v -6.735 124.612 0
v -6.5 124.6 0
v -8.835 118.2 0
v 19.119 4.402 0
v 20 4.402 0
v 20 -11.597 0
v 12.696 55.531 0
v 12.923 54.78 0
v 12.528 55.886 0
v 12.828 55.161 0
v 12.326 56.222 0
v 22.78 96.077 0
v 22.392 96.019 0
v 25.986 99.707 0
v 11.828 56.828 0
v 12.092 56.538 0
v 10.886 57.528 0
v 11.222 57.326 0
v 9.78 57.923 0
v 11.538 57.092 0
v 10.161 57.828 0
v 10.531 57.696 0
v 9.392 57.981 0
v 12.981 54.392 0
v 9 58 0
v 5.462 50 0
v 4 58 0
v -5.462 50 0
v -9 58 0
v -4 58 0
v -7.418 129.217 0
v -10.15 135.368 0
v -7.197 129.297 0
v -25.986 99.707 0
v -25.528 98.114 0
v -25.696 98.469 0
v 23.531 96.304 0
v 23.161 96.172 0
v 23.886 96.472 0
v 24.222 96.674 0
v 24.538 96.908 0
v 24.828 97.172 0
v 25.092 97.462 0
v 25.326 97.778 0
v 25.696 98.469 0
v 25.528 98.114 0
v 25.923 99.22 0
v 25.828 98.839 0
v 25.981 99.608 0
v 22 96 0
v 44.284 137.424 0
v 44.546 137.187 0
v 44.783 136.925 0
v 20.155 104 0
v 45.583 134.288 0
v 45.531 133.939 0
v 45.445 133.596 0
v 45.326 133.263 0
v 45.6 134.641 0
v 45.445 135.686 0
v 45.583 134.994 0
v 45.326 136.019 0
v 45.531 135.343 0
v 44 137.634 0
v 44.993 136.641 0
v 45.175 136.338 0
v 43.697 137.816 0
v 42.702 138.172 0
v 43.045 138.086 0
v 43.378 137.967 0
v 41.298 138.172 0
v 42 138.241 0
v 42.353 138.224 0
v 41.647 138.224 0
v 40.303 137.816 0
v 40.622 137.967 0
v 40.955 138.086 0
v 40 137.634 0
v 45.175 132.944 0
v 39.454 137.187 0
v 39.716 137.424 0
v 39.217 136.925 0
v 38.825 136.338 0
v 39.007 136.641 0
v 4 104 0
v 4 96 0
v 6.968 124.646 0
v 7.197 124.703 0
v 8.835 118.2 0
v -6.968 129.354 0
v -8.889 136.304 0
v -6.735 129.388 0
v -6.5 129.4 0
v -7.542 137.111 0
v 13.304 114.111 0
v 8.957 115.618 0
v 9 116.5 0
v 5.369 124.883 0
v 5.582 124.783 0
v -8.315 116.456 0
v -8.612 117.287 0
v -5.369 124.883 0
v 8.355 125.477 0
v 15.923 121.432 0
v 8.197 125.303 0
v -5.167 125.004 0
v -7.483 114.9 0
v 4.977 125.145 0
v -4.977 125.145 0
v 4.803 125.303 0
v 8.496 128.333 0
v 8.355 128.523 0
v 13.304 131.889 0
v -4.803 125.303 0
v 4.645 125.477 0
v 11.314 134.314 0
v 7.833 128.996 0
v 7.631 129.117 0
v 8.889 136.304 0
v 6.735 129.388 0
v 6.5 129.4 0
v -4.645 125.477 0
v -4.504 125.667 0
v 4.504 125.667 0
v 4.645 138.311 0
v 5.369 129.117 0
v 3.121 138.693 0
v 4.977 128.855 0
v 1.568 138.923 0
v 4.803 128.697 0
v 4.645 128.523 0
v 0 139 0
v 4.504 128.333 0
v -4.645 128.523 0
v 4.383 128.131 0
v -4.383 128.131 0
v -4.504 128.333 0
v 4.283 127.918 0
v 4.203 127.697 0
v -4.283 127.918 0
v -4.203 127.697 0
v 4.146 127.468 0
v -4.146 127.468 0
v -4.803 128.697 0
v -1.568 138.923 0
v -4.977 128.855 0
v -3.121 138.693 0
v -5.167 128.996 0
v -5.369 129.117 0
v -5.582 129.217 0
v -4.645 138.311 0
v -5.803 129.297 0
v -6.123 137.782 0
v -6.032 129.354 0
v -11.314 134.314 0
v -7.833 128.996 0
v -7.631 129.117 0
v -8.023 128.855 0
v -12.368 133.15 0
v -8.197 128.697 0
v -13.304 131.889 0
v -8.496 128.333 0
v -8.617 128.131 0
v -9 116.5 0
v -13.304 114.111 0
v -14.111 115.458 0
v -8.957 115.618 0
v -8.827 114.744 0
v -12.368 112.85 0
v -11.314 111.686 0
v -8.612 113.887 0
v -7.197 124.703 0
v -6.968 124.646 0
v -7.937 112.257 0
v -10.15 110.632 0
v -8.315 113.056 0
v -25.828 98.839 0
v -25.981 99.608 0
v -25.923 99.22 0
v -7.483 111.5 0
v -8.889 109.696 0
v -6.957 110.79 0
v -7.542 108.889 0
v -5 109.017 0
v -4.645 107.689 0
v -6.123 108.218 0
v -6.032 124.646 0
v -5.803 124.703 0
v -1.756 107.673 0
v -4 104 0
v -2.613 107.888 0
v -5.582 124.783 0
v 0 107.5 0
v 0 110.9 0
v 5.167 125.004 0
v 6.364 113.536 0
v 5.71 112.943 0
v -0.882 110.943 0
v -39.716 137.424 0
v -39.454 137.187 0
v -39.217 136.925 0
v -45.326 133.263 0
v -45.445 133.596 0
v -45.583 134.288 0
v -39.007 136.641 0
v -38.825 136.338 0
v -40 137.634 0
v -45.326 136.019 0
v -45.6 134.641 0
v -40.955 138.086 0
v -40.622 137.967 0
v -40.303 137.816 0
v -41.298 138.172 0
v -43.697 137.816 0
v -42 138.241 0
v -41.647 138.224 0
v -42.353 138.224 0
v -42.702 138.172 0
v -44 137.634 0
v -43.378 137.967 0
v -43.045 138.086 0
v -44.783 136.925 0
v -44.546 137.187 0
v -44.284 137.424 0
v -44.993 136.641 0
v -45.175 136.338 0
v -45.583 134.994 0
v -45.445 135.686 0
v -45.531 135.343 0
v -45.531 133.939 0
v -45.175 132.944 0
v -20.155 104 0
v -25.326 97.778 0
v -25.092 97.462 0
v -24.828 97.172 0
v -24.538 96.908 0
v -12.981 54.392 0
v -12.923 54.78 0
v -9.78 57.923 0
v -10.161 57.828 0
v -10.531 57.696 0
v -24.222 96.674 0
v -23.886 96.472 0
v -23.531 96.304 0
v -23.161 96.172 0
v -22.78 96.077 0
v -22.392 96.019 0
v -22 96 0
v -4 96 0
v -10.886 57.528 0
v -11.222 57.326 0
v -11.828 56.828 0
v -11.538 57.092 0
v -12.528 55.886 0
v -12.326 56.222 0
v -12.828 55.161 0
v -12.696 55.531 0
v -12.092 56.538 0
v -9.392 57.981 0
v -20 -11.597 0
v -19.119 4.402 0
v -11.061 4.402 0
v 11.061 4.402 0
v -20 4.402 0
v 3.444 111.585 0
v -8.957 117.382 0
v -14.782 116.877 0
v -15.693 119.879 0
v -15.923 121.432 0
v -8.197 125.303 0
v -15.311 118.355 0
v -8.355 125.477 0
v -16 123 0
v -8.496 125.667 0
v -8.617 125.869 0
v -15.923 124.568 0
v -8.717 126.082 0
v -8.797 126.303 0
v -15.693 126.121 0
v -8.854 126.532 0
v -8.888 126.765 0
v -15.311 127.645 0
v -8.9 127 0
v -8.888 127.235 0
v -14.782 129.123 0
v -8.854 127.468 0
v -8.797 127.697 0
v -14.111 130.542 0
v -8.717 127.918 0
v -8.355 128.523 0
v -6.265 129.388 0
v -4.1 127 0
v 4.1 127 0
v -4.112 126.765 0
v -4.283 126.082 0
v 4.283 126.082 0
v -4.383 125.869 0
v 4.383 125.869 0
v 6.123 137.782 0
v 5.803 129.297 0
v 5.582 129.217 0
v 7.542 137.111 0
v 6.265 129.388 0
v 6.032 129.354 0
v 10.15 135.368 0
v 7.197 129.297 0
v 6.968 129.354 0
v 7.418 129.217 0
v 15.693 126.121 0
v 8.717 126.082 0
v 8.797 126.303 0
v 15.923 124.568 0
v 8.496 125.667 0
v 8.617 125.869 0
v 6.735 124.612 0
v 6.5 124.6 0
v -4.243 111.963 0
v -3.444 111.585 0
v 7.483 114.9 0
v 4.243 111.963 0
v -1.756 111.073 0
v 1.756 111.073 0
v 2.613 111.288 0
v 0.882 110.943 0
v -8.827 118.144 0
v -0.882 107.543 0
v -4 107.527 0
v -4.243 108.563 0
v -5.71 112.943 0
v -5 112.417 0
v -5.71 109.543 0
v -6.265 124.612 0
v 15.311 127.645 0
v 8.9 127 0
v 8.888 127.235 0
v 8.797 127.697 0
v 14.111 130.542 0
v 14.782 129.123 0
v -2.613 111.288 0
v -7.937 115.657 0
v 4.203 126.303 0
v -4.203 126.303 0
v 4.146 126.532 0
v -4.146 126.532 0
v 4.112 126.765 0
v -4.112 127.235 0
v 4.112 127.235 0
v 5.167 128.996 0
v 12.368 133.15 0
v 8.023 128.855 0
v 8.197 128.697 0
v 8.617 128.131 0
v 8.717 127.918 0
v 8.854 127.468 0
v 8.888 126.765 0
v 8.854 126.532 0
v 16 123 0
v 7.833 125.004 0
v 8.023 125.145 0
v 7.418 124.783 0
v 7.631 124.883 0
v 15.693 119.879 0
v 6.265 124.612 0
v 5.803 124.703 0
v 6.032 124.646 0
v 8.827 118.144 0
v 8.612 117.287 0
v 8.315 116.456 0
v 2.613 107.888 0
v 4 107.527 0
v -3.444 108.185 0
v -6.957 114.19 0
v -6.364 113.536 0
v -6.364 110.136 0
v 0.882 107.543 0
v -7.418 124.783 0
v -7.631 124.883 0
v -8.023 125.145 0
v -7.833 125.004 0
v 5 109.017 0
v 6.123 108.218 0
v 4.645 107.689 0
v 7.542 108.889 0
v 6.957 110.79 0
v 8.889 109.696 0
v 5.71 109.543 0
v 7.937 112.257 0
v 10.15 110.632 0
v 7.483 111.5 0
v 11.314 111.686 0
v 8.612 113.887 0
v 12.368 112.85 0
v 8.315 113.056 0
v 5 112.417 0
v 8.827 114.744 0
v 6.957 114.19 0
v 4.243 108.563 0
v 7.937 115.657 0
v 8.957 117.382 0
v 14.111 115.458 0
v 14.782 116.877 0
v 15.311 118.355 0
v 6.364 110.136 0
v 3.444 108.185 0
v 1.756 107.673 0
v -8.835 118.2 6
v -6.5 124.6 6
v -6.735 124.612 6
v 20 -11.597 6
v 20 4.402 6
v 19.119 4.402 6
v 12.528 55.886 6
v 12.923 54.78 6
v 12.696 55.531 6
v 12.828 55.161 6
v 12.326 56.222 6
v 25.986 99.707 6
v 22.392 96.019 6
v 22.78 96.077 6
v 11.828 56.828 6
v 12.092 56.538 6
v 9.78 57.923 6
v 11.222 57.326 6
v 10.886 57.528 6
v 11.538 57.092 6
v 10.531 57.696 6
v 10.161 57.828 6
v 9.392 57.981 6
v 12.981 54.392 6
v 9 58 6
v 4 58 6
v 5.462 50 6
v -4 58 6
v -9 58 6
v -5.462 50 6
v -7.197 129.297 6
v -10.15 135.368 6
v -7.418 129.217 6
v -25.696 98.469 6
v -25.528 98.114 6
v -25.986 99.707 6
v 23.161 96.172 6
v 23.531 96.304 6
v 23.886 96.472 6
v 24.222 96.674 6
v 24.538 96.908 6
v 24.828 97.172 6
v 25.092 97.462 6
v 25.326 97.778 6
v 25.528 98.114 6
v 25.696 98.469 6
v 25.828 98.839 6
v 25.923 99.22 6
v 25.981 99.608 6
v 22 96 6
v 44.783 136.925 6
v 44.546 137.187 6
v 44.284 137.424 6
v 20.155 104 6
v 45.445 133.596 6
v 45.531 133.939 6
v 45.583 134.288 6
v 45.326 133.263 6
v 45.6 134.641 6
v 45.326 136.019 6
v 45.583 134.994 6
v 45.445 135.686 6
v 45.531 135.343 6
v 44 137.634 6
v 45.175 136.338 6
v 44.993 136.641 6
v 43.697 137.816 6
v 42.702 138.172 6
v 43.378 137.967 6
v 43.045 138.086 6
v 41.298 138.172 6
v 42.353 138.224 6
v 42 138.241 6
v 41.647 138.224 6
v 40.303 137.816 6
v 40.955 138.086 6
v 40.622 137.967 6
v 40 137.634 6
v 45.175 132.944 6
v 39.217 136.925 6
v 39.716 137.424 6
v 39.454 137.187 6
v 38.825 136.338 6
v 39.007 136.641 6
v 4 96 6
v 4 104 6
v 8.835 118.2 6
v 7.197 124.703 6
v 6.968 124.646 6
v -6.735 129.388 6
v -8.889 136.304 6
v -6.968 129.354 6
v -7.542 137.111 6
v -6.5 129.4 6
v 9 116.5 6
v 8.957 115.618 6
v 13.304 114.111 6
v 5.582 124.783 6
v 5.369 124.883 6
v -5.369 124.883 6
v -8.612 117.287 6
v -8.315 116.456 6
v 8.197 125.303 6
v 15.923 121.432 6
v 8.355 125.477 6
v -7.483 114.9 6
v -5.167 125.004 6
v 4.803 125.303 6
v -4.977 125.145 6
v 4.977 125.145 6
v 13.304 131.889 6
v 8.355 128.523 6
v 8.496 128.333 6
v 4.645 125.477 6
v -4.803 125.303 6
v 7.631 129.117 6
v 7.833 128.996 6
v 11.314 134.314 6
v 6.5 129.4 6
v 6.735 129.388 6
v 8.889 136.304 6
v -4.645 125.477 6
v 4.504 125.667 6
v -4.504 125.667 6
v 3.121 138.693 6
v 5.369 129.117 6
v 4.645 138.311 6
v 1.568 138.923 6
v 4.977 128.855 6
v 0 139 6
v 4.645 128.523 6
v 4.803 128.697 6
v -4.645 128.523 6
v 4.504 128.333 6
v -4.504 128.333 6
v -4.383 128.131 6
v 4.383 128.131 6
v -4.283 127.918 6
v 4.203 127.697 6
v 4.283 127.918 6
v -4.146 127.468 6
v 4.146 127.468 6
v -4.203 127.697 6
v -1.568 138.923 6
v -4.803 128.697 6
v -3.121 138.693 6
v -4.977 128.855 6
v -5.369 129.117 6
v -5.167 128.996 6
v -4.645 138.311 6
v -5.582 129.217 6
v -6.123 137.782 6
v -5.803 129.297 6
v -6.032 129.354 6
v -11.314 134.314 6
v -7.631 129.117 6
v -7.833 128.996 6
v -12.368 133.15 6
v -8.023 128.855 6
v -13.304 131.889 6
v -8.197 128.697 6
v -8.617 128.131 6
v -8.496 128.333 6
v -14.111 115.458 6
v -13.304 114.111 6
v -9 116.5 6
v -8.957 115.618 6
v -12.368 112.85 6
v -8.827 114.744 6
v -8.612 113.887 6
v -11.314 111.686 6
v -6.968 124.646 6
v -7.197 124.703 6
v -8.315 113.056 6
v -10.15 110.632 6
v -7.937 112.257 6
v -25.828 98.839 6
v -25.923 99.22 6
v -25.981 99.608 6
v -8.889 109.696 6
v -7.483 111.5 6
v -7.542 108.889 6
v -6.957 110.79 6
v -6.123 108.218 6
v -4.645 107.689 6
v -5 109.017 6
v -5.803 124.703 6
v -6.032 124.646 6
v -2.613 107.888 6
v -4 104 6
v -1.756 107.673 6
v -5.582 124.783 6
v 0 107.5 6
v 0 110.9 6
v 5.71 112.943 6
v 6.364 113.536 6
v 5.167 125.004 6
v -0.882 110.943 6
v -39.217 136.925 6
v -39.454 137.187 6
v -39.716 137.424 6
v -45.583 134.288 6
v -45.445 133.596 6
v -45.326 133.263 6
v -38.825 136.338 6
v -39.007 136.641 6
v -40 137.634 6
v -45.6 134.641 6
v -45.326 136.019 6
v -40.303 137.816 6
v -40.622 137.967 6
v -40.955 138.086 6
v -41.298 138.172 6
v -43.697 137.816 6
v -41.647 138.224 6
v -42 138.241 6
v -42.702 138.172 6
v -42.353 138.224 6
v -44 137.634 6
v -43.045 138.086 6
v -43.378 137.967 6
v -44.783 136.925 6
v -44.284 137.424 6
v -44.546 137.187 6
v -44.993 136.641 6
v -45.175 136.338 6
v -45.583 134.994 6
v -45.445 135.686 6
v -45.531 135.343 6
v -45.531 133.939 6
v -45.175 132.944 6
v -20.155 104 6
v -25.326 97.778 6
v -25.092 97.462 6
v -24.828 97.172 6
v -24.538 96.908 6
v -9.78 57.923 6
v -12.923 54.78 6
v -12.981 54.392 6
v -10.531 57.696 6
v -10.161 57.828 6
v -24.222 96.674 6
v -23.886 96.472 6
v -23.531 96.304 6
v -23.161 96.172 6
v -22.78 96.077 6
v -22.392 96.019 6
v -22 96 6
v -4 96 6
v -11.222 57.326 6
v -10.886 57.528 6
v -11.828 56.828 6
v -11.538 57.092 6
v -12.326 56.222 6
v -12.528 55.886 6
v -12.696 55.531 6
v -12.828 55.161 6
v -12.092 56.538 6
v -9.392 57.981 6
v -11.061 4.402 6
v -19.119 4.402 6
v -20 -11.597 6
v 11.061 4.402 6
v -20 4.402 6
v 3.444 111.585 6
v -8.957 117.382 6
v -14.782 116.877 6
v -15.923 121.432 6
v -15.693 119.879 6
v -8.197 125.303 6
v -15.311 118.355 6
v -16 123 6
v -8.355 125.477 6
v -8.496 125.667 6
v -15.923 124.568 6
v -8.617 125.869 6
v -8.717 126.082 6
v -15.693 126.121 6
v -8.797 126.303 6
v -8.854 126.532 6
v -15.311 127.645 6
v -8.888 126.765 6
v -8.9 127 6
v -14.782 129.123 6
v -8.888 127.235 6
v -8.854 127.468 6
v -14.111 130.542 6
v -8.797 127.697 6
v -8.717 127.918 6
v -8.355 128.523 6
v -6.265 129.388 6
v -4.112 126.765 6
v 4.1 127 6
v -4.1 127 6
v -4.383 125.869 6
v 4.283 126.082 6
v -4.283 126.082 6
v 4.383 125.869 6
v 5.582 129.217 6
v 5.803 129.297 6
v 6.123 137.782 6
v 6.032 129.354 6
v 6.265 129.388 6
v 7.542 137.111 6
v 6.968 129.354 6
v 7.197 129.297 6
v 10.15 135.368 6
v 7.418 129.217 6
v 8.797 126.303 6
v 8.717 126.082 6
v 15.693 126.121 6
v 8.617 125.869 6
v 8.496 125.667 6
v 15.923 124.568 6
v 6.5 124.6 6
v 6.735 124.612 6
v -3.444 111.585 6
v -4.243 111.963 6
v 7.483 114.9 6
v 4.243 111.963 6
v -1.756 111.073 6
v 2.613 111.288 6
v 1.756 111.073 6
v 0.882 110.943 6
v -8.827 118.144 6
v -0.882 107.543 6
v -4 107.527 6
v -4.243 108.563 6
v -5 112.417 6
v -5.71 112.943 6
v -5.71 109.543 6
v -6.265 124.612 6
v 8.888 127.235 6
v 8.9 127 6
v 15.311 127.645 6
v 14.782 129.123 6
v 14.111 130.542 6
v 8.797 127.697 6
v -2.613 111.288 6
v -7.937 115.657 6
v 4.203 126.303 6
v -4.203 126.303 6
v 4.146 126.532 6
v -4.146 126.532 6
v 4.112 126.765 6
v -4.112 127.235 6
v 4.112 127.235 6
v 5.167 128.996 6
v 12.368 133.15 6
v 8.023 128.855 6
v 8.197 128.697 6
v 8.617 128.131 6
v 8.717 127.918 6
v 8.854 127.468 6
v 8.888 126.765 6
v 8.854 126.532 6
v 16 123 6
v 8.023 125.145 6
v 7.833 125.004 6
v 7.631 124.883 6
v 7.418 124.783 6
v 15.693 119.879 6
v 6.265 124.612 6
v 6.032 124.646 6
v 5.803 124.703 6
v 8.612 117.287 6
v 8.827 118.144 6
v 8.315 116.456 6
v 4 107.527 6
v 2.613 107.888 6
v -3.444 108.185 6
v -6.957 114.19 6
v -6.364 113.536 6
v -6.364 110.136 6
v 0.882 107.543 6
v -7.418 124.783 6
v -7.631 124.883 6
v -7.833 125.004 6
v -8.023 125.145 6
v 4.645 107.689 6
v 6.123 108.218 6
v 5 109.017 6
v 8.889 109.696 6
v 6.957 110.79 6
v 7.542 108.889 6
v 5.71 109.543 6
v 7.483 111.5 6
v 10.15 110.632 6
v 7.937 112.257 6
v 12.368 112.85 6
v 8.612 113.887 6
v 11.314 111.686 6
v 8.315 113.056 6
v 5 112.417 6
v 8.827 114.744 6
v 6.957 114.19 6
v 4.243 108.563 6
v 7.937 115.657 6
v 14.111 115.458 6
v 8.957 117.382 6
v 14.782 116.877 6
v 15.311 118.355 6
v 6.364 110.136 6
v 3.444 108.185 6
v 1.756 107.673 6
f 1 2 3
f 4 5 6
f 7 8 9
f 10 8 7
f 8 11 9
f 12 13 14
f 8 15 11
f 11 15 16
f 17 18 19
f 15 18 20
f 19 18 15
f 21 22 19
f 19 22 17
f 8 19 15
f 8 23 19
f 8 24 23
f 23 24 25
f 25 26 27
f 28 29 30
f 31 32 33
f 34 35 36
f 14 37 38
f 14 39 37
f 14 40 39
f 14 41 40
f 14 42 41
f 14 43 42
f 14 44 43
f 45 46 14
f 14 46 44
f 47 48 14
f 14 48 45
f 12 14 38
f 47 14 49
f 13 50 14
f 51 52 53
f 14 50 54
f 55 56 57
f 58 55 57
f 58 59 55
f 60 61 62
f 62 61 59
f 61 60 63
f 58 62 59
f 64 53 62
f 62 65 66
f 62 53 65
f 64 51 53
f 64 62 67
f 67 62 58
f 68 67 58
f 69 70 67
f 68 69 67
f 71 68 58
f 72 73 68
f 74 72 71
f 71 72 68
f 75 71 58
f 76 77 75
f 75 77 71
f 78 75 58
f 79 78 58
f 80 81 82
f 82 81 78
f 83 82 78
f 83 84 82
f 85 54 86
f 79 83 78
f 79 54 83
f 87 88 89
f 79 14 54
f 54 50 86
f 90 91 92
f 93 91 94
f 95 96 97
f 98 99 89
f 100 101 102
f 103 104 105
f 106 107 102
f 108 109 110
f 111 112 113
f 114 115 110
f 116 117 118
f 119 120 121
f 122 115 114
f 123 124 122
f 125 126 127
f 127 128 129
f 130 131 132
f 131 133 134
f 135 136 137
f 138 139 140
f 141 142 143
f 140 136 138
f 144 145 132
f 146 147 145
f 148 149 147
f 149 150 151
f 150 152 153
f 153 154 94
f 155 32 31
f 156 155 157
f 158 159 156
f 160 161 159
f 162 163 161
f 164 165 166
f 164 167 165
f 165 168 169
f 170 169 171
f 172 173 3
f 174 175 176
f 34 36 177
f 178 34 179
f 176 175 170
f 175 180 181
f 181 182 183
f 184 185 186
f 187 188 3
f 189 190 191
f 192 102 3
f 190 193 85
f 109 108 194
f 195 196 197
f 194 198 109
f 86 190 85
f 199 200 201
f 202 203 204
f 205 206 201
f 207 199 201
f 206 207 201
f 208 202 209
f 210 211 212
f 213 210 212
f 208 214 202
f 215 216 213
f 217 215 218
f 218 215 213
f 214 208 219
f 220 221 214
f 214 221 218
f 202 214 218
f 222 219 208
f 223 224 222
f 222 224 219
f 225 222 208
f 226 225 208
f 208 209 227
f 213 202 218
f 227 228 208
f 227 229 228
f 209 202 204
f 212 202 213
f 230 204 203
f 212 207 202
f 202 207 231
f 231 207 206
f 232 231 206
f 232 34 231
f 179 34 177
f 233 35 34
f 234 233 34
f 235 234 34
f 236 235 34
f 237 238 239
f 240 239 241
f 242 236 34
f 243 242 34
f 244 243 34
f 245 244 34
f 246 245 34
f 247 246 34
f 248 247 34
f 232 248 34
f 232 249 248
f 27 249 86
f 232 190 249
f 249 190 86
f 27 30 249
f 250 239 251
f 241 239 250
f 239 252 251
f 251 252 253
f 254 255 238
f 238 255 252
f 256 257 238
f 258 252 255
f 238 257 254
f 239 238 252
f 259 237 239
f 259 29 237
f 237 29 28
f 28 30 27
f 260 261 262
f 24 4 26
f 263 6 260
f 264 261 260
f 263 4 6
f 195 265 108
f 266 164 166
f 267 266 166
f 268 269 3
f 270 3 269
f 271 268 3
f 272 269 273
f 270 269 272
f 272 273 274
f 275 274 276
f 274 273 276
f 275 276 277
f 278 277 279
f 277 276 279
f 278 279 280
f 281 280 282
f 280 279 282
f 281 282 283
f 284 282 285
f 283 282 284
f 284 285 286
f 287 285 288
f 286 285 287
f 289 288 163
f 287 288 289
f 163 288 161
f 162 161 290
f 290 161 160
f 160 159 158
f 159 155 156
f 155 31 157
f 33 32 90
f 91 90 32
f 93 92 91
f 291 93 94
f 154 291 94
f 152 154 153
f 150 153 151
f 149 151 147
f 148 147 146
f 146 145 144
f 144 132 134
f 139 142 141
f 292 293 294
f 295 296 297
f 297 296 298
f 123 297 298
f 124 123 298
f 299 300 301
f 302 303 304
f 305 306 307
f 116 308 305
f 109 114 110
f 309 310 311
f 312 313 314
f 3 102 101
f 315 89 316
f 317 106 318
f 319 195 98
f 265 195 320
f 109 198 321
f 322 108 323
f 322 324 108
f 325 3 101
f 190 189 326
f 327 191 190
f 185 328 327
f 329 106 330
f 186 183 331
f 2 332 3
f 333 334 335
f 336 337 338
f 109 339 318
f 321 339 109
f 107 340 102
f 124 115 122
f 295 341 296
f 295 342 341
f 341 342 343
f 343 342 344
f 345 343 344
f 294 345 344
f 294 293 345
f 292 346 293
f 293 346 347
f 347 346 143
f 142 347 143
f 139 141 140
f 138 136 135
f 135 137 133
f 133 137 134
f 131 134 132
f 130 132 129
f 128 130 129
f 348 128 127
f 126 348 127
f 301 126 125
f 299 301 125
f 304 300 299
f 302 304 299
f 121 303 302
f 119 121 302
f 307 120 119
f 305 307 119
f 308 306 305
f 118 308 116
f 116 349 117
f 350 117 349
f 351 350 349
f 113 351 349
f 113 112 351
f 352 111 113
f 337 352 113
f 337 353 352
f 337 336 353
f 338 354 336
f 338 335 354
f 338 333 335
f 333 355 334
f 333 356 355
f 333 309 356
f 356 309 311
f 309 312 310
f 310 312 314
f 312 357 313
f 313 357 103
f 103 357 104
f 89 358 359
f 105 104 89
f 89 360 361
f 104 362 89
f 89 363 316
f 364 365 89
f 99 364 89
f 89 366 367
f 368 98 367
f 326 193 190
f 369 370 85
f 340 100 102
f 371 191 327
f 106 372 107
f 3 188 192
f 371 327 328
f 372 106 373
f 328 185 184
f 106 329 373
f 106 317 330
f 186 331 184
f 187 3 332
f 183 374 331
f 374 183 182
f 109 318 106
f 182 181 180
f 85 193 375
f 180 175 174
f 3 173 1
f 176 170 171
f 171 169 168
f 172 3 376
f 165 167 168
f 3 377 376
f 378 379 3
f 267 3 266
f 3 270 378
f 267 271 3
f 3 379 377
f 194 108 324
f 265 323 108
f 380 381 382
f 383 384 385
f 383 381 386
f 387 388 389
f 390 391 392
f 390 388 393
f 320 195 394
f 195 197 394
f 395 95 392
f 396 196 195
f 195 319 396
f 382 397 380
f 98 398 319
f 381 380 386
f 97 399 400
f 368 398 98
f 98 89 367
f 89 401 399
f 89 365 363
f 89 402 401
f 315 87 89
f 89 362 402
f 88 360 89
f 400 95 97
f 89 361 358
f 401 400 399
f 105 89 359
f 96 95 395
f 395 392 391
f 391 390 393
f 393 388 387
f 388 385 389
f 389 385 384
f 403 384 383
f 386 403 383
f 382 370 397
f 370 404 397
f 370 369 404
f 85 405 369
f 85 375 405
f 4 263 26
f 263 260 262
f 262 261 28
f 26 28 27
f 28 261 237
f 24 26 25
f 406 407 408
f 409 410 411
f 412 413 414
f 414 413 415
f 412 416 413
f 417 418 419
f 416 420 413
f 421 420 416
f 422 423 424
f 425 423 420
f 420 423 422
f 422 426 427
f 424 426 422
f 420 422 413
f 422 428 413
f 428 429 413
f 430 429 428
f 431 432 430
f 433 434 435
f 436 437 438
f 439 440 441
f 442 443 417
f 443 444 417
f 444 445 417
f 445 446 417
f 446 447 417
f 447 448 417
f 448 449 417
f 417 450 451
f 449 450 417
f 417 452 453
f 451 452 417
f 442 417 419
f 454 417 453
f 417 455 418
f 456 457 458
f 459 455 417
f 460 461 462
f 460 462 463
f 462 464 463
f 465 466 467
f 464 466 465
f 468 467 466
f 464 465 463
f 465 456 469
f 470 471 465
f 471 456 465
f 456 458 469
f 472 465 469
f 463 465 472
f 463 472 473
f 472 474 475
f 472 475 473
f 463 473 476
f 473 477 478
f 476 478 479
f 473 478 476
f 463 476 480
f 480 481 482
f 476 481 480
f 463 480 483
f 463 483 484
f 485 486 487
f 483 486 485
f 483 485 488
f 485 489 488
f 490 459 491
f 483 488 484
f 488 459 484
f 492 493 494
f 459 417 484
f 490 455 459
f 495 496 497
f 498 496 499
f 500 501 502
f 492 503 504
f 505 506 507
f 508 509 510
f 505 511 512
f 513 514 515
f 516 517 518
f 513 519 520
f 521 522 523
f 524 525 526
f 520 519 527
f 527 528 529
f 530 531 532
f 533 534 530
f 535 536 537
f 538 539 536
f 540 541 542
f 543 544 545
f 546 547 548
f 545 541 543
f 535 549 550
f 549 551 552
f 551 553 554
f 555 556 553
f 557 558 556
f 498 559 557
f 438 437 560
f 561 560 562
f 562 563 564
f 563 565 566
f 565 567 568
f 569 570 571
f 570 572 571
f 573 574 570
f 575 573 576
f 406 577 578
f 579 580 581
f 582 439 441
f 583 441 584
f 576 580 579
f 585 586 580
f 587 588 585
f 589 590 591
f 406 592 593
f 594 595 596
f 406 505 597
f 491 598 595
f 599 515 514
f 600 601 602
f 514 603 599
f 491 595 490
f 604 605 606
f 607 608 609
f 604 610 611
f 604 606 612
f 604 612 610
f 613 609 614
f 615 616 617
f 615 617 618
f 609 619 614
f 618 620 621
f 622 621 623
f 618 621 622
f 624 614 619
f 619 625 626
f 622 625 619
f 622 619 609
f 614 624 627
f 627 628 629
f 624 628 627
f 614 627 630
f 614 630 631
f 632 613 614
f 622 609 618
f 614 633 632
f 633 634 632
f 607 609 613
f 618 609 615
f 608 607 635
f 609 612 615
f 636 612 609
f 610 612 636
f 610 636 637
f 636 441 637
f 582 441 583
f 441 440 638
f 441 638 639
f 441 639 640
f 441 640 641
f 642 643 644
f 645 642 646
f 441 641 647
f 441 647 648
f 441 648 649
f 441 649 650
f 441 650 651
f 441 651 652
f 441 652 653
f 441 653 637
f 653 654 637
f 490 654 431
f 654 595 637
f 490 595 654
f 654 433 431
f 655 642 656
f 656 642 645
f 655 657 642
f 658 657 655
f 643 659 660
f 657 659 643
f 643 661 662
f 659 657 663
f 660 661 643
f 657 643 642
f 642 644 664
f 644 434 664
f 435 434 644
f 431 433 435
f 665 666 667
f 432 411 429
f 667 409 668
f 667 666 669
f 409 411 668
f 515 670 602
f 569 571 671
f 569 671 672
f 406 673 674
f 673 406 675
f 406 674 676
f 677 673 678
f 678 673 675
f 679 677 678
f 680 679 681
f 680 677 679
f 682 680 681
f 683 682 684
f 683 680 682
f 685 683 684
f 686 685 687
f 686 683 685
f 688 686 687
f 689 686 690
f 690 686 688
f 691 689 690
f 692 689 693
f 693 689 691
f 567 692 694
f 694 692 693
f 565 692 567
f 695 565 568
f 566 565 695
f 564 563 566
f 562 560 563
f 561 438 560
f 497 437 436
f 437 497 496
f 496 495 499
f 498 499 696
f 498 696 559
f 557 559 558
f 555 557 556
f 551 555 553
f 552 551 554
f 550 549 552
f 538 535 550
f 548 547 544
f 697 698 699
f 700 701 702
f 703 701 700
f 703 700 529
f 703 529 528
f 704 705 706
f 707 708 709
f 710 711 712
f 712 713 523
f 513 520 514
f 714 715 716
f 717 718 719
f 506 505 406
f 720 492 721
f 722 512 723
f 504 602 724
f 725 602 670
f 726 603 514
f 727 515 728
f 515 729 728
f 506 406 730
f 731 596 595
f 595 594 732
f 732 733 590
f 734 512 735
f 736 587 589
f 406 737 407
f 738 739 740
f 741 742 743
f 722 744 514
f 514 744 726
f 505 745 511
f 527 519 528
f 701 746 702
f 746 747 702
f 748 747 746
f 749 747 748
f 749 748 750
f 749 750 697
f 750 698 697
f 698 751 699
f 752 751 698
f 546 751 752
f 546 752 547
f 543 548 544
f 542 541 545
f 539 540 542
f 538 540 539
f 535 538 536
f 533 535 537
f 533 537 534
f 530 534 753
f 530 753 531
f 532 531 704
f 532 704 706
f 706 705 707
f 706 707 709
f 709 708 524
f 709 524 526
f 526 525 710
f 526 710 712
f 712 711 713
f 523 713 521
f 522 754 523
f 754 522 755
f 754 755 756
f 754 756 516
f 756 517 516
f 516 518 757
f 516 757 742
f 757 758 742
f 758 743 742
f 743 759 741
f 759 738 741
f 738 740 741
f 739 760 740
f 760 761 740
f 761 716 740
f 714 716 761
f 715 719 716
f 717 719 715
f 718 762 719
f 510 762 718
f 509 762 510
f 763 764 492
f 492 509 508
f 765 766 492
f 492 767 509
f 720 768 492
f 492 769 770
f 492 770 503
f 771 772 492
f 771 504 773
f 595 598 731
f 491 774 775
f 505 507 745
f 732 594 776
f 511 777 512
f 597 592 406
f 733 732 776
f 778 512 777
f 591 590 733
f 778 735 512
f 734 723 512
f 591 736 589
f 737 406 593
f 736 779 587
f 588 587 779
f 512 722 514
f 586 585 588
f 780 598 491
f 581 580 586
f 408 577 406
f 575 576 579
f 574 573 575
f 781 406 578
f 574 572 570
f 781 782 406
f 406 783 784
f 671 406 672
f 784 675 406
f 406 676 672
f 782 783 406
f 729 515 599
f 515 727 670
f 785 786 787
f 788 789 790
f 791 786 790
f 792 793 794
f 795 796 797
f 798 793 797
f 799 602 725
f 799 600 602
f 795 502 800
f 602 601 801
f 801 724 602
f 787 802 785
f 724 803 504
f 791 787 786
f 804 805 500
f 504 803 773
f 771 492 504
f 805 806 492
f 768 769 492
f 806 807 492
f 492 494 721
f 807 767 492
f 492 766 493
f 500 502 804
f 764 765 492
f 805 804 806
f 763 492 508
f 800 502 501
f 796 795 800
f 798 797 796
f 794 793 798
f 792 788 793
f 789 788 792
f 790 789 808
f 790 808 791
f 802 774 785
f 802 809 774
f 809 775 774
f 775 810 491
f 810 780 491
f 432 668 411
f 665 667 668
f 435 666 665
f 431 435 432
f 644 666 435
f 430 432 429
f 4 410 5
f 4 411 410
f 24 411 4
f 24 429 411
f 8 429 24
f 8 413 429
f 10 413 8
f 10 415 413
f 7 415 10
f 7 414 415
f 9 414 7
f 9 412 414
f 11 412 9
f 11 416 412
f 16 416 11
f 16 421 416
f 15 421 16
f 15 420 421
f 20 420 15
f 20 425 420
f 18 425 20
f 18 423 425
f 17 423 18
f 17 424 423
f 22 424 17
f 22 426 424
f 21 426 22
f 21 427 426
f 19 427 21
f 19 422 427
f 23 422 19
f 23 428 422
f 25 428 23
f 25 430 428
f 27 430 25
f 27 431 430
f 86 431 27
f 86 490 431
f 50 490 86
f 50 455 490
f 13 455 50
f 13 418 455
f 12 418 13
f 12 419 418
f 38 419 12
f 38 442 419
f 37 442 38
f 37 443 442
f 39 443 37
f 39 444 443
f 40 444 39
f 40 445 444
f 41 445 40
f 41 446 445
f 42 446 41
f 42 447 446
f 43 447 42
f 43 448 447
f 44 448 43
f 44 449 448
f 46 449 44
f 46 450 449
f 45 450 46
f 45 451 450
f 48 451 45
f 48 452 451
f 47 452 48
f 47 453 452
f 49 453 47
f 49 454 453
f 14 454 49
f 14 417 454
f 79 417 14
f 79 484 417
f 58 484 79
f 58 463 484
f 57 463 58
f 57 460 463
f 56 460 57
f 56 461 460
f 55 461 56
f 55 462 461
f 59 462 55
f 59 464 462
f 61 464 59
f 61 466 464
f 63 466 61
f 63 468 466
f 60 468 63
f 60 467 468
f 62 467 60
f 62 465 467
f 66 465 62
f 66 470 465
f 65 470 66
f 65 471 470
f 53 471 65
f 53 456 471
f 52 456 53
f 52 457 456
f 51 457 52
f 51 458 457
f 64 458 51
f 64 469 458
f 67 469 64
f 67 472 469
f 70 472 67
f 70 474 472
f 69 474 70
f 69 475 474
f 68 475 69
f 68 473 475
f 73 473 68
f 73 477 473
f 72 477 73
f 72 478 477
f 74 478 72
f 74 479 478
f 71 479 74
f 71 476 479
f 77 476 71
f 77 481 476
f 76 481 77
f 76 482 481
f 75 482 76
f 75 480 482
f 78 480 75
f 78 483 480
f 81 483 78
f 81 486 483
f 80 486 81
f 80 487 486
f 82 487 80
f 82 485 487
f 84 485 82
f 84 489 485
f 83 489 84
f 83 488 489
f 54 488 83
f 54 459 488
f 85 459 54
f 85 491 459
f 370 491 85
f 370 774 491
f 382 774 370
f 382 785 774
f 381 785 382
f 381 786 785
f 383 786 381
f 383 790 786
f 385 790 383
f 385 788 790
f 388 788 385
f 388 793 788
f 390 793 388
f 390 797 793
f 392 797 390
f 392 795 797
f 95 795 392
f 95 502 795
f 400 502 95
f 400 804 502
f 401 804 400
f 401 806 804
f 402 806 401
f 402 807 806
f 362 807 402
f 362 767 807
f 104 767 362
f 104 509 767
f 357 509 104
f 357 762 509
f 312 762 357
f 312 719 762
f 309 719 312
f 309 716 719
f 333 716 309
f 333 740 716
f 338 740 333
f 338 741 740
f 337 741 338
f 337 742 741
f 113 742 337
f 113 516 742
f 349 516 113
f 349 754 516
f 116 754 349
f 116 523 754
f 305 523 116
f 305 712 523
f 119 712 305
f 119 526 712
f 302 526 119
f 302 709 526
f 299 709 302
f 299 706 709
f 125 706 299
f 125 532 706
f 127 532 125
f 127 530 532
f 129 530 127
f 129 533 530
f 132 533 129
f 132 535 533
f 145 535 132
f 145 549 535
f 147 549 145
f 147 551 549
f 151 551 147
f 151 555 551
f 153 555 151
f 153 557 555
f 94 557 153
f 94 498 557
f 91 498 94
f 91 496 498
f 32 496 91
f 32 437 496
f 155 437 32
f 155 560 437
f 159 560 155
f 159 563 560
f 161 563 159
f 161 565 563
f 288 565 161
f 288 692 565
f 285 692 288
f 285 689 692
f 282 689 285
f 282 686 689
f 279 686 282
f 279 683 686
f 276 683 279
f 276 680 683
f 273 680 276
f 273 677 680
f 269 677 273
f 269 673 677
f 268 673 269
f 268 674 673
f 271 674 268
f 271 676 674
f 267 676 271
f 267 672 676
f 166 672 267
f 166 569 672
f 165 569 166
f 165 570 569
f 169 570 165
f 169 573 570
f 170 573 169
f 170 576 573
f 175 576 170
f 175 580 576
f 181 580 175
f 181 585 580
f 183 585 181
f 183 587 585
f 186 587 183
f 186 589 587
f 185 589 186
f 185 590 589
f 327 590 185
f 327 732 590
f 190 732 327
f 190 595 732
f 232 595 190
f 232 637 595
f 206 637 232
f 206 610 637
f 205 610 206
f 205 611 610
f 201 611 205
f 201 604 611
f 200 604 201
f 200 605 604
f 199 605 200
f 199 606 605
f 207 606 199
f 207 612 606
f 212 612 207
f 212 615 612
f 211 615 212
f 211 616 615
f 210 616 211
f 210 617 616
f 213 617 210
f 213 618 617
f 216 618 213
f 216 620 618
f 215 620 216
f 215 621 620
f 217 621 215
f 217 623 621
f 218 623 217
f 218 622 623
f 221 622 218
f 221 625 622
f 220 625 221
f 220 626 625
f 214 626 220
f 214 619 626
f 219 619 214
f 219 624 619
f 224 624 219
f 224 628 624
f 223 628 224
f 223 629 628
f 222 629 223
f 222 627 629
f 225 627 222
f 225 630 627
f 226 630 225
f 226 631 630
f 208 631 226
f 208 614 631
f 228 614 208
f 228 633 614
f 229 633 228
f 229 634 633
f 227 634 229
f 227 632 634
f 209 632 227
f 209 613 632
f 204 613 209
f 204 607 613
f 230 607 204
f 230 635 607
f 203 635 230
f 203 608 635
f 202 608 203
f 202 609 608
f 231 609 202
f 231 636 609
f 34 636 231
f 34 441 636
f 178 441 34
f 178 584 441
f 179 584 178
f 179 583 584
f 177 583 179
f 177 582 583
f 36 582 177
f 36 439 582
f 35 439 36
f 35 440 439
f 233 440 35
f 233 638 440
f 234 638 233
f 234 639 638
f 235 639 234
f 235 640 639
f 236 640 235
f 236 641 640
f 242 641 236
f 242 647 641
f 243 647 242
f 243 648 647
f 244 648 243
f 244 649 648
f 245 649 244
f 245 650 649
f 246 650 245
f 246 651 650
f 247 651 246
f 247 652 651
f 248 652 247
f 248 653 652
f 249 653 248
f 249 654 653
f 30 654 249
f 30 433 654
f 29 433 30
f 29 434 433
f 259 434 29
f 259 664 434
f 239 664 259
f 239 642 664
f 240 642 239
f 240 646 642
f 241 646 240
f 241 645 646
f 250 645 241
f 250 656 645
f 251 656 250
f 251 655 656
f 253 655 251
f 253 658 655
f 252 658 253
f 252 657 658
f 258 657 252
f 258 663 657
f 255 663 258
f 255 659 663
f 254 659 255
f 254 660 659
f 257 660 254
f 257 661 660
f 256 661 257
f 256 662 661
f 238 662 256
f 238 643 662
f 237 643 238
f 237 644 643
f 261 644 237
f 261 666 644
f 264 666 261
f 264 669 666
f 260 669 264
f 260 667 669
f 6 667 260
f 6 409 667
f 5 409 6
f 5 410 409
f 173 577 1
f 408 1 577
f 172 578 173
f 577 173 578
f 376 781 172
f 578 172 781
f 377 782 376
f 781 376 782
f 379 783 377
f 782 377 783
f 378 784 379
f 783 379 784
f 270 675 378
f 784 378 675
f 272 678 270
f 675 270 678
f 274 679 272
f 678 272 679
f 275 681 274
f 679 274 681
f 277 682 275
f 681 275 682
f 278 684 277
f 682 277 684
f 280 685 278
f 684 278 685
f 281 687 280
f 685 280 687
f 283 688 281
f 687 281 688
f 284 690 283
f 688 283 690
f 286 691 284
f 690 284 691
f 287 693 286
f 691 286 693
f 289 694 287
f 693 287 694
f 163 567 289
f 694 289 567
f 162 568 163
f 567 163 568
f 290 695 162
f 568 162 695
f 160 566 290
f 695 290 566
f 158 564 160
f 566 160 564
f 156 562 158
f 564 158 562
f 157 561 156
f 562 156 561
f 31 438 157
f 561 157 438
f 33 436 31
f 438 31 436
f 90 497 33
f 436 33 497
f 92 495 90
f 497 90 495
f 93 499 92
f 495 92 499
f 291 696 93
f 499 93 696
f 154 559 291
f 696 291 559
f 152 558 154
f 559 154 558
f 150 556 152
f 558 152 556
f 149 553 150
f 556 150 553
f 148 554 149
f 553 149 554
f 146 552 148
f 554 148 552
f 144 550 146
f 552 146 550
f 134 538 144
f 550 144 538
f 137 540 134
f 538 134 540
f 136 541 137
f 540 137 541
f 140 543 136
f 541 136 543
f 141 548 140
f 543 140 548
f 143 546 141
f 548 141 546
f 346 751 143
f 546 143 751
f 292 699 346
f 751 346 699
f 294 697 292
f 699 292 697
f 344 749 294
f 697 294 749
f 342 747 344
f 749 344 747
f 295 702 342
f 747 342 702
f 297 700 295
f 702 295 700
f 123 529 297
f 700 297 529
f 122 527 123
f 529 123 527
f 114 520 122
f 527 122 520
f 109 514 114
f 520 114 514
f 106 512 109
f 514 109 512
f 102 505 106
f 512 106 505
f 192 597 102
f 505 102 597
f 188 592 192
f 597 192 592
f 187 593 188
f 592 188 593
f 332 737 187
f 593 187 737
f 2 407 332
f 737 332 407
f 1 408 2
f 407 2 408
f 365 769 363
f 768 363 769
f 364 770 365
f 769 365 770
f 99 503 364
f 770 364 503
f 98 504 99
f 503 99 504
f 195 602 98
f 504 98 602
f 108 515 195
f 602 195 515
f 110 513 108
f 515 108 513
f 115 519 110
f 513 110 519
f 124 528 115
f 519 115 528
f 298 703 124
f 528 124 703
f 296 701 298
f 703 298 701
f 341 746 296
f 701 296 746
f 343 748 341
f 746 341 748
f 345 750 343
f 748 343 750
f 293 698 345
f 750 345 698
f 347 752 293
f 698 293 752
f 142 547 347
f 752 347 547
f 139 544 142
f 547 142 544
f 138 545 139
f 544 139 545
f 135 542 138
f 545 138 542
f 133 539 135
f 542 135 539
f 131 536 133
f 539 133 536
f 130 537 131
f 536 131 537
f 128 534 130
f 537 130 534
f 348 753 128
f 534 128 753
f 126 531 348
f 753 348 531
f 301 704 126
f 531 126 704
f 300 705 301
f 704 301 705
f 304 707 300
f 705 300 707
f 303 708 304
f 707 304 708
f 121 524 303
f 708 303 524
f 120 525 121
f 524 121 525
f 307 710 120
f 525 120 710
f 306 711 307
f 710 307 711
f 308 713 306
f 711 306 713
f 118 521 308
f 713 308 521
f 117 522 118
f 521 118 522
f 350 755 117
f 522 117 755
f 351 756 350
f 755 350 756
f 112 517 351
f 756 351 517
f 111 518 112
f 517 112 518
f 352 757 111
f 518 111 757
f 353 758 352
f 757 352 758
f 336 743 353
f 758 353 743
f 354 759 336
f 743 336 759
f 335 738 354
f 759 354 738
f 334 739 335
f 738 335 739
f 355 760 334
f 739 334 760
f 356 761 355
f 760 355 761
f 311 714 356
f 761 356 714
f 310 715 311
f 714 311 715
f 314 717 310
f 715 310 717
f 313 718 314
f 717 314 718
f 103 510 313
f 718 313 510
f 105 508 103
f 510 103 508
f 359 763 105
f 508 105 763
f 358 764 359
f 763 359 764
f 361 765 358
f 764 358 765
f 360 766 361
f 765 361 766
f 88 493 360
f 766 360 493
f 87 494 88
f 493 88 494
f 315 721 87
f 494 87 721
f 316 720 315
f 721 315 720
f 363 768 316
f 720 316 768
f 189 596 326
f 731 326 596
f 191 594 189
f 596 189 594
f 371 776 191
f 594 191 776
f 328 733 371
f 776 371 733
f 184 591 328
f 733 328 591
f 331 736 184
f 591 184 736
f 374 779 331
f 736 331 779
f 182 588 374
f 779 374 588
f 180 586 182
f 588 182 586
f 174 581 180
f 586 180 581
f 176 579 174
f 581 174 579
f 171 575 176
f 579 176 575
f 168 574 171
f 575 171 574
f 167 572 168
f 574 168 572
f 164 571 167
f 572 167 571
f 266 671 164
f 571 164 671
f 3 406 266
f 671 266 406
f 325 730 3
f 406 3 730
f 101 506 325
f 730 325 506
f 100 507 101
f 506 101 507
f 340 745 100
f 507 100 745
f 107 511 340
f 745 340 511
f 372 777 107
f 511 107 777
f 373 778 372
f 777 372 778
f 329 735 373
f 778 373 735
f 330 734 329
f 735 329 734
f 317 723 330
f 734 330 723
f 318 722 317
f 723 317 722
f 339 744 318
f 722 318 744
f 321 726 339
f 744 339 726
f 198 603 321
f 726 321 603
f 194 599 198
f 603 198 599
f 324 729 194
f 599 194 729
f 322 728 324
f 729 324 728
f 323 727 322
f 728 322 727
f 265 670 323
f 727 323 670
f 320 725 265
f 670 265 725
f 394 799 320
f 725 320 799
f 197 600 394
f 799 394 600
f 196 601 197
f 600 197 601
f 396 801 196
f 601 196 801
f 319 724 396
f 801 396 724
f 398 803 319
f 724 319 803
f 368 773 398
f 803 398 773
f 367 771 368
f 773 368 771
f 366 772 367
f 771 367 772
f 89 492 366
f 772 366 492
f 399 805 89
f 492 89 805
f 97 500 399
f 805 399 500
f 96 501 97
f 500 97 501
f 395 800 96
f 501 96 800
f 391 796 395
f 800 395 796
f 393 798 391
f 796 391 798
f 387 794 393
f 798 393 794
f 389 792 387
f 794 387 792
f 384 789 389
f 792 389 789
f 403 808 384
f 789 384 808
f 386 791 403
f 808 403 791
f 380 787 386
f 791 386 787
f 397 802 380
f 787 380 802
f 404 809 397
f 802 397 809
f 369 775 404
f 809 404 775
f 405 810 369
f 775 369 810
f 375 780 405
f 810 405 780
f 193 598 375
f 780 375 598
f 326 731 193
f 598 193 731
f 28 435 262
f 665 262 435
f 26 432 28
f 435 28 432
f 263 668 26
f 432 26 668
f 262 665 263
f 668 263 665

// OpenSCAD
// Stick figure photography props - happy, sad, shocked, scared, stoic,
// half, and poe (Edgar Allan Poe)
// Flat cutouts, printed lying flat. No supports.
//   figure: openscad -D 'mood="sad"'   -o stick_sad.stl   stick_figures.scad
//   stand:  openscad -D 'part="stand"' -o stick_stand.stl stick_figures.scad

part       = "figure"; // "figure" | "stand" | "raven"
base       = "tang";   // "tang" = plugs into the separate stand
                       // "block" = cast into a solid plinth, prints standalone
mood       = "happy";  // happy | sad | shocked | scared | stoic | half | poe
render_all = false;    // true = lay out all seven moods side by side (preview only)
                       // (poe's hair, collar and longer neck follow `mood`, so
                       // they only appear when mood = "poe")

$fn = 64;

thickness = 6;   // extrusion depth; also the stand slot thickness
limb_w    = 8;
head_r    = 16;

hip_y      = 54;  // height of the pelvis above the feet
torso_len  = 46;  // pelvis -> shoulder line
shoulder_w = 44;  // full width of the shoulder bar (this is what was missing)
hip_w      = 18;  // full width of the pelvis bar
arm_len    = 40;
leg_len    = 54;
// poe needs a longer neck than the rest of the family: a wing collar has to be
// visible BETWEEN the chin and the shoulder bar, and 7mm of neck leaves it
// looking like a slightly fat neck instead of a collar.
neck_len   = (mood == "poe") ? 14 : 7;

tang_w = 40;  // plug under the feet that drops into the stand
tang_h = 12;

// For OTHER files that plug into this stand: `use` this file and call
// tang_dims() for [width, height, thickness] rather than retyping them.
function tang_dims() = [tang_w, tang_h, thickness];

// base = "block": cast the legs into a solid plinth instead. Prints as one
// piece, stands unaided, no separate stand needed.
block_w = 58;
block_h = 28;
block_d = 22;  // front-to-back depth; this is what keeps it upright
block_over = 1;  // how far the plinth rises past the tang - see figure()

fit_clearance = 0.5;  // slot is this much wider than `thickness`
                      // verified on the P1S in PLA: snug, correct fit
stand_l = 76;
stand_w = 34;
stand_h = 16;
slot_d  = 13;

spacing = 130;  // preview layout only

shoulder_y = hip_y + torso_len;
head_cy    = shoulder_y + neck_len + head_r;

// unit vector pointing "down and out", angle measured from straight down
function vdown(a, s) = [s*sin(a), -cos(a)];
function foot(a, s)  = [s*hip_w/2, hip_y] + leg_len*vdown(a, s);

module rod(p1, p2, w) {
    hull() {
        translate(p1) circle(d = w);
        translate(p2) circle(d = w);
    }
}

// ---------------------------------------------------------------- body

// POE, ADDITIVE. Everything in face() is a HOLE; these are silhouette, so they
// belong here. A caricature at 32mm across has room for about four ideas, and
// Poe's are: the moustache (does most of the work), the high domed forehead
// with hair swept back off it, heavy low brows, and the 1840s wing collar.
//
// Hair is added rather than cut because it has to change the OUTLINE - a
// receding hairline only reads if the head silhouette is no longer a circle.
module poe_hair() {
    // The head is r=16. Hair placed at radius 13 with r=8 circles only breaks
    // the outline by 3-5mm, which reads as a MISSHAPEN SKULL rather than hair -
    // that was the first attempt. It has to clear the head decisively and be
    // obviously asymmetric, or the eye reads it as a bad circle.
    hull() { translate([-4, 13]) circle(r = 9.5);
             translate([ 6, 12]) circle(r = 8.0); }
    // the sweep: a defined point out to one side, which is the single feature
    // that says "parted and combed across" instead of "hat"
    hull() { translate([-4, 13]) circle(r = 9.5);
             translate([-19, 7]) circle(r = 3.2); }
    // fills the back of the crown so the sweep does not look stuck on
    hull() { translate([ 6, 12]) circle(r = 8.0);
             translate([13,  3]) circle(r = 5.0); }
}

// 1840s wing collar and cravat, filling the 7mm of neck between the shoulder
// bar and the chin. Small, but it is the difference between a moustache on a
// stick figure and a Victorian one.
module poe_collar() {
    // wing collar: points UP and OUT from the cravat, which is the shape that
    // says 1840s. Kept wider than the shoulder bar is thick so it is not just
    // read as more neck.
    for (s = [-1, 1])
        hull() { translate([s*2,  2]) circle(r = 3.0);
                 translate([s*11, 10]) circle(r = 1.6); }
    translate([0, 3]) circle(r = 4.2);          // cravat knot
}

module body(arm_l, arm_r, leg_a) {
    sh_x = shoulder_w/2;
    hp_x = hip_w/2;

    rod([-sh_x, shoulder_y], [sh_x, shoulder_y], limb_w);  // shoulder bar
    rod([-hp_x, hip_y],      [hp_x, hip_y],      limb_w);  // pelvis bar
    rod([0, hip_y],          [0, shoulder_y],    limb_w);  // spine
    rod([0, shoulder_y],     [0, head_cy],       limb_w);  // neck

    for (s = [-1, 1]) {
        shoulder = [s*sh_x, shoulder_y];
        arm_a    = (s == -1) ? arm_l : arm_r;
        rod(shoulder, shoulder + arm_len*vdown(arm_a, s), limb_w*0.9);
        rod([s*hp_x, hip_y], foot(leg_a, s), limb_w);
    }

    translate([0, head_cy]) circle(r = head_r);
    if (mood == "poe") {
        translate([0, head_cy]) poe_hair();
        translate([0, shoulder_y]) poe_collar();
    }

    // plinth the feet sink into; also the plug that drops into the stand
    fy = foot(leg_a, 1)[1];
    translate([-tang_w/2, fy - tang_h]) square([tang_w, tang_h + limb_w/2]);
}

// ---------------------------------------------------------------- face

module brow(s, tilt, y) {
    translate([s*6.5, y])
        rotate([0, 0, s*-tilt])
            square([9, 2], center = true);
}

module smile(open_up) {
    // crescent: subtract an offset copy of the same circle
    difference() {
        circle(r = 9);
        translate([0, open_up ? 3.4 : -3.4]) circle(r = 9);
    }
}

module wavy_mouth() {
    pts = [for (i = [0:6]) [-7.5 + i*2.5, (i % 2 == 0) ? 1.4 : -1.4]];
    for (i = [0:len(pts)-2]) rod(pts[i], pts[i+1], 2);
}

// The moustache. Blunt tips on purpose: tapering them to points would put the
// ends under the 1.2mm where a feature prints inconsistently, and a moustache
// with one thin side and one fat side is worse than a slightly blunt one.
module poe_moustache() {
    circle(r = 2.6);
    for (s = [-1, 1])
        hull() { translate([s*3, 0])  circle(r = 2.6);
                 translate([s*8.5, -2.4]) circle(r = 1.8); }
}

module face(m) {
    wide  = (m == "shocked" || m == "scared");
    eye_r = (m == "poe") ? 2.2 : wide ? 3.6 : 2.4;
    eye_y = (m == "poe") ? 3 : 4;

    // poe: heavy brows sitting LOW and level - deep-set and unamused, not sad.
    // Angling them would read as a mood; Poe reads as a face.
    tilt = (m == "sad") ? 18 : (m == "scared") ? 24 : (m == "poe") ? -6 : 0;
    brow_y = (m == "poe") ? 8.5 : eye_y + (wide ? 8 : 6.5);

    // 1.2mm is the smallest feature this printer resolves, and the same limit
    // applies to the GAP between two features - the alien's eyes were 0.28mm
    // apart and printed as one slot. Check it rather than eyeballing it.
    assert(m != "poe" || (brow_y - 1.5) - (eye_y + eye_r) >= 1.2,
           "poe: brow and eye are too close and will merge into one hole");

    translate([0, head_cy]) {
        for (s = [-1, 1]) {
            translate([s*6.5, eye_y]) circle(r = eye_r);
            // happy reads better browless; "half" raises one brow only
            if (m == "half") { if (s == -1) brow(s, 0, brow_y + 1); }
            else if (m == "poe") translate([s*6.5, brow_y])
                                     rotate([0, 0, s*-tilt])
                                         square([11, 3], center = true);
            else if (m != "happy") brow(s, tilt, brow_y);
        }

        translate([0, -6.5]) {
            if (m == "happy")        smile(true);
            else if (m == "sad")     smile(false);
            else if (m == "shocked") circle(r = 4);
            else if (m == "stoic")   rod([-6, 0], [6, 0], 2.4);
            else if (m == "half")    rotate([0, 0, 20]) smile(true); // lopsided
            else if (m == "poe")     { translate([0, 1.5]) poe_moustache();
                                       translate([0, -5.5]) rod([-3.5, 0], [3.5, 0], 2); }
            else                     wavy_mouth();   // scared
        }

        if (m == "sad") translate([-6.5, -3]) circle(r = 2.1); // tear
    }
}

// ---------------------------------------------------------------- parts

module figure(m) {
    // arms are per-side so a figure can be asymmetric (see "half")
    // poe: arms DOWN. Folded arms were tried and abandoned - swung inward they
    // merge with the torso into one solid triangle, and a stick figure whose
    // limbs have fused is no longer a stick figure. The head carries this one.
    arm_l = (m == "poe")     ? 14 :
            (m == "happy")   ? 150 :
            (m == "sad")     ?  16 :
            (m == "shocked") ? 112 :
            (m == "stoic")   ?  90 :
            (m == "half")    ? 150 : 168;  // scared: hands up by the head
    arm_r = (m == "half")    ?  18 : arm_l;

    // legs stay near-vertical: splayed legs + the plinth read as a skirt
    leg_a = (m == "poe")     ? 3 :
            (m == "happy")   ? 7 :
            (m == "shocked") ? 7 :
            (m == "scared")  ? 2 : 4;

    blocked = (base == "block");
    // Figure stays flush with the bed (z=0) and the block grows behind it.
    // Centring the figure in the block would float it 8mm up and force
    // supports under every limb; the block's depth alone keeps it upright.
    linear_extrude(height = thickness)
        difference() {
            body(arm_l, arm_r, leg_a);
            face(m);
        }

    if (blocked) {
        fy = foot(leg_a, 1)[1];
        // +block_over on the height, NOT on the origin: the plinth has to rise
        // PAST the tang's top edge rather than meet it. Both were landing on
        // exactly y = fy + limb_w/2, and two solids sharing a plane are two
        // solids - every mood reported exactly 8 unshared edges along that line,
        // deterministically, since long before poe existed. Overlap 0.4mm or
        // more; 1mm here, and the tang ends up entirely inside the plinth.
        translate([-block_w/2, fy + limb_w/2 - block_h, 0])
            cube([block_w, block_h + block_over, block_d]);
    }
}

// ---------------------------------------------------------------- raven
//
// A companion piece, not a mood - so it is a `part`, not a `mood`. It lives in
// THIS file rather than its own because it shares the tang and therefore the
// stand: duplicating tang_w and thickness into a second file is how two parts
// that are supposed to fit the same socket quietly stop fitting it.
//
// Perched, hunched, side profile, facing left. About 90mm tall against the
// figure's 193, which is the proportion that reads as "bird beside a man"
// rather than "small man".

raven_leg_w = 6;
raven_foot_y = 0;    // feet sit here; the tang hangs below

module raven_body() {
    // torso: two hulls sharing the big chest circle, so the back tapers up to
    // the neck and the belly tapers down to the legs
    hull() { translate([ 4, 40]) circle(r = 21);
             translate([-2, 63]) circle(r = 15); }
    hull() { translate([ 4, 40]) circle(r = 21);
             translate([11, 21]) circle(r = 12); }

    // neck into head, HUNCHED - head forward of the shoulders and set low. An
    // upright neck reads as a songbird; a raven broods.
    hull() { translate([ -2, 63]) circle(r = 15);
             translate([-15, 74]) circle(r = 12); }

    // THE BEAK IS THE TELL. A raven's is long, deep at the base and hooks down
    // at the tip; the first attempt was a short wedge and the whole bird read
    // as a kingfisher. Blunt tip on purpose - a true point tapers below 1.2mm
    // and prints as a ragged whisker.
    hull() { translate([-21, 73]) circle(r = 7.5);
             translate([-41, 69]) circle(r = 3.4); }
    hull() { translate([-41, 69]) circle(r = 3.4);
             translate([-50, 64]) circle(r = 1.8); }   // the hook

    // HACKLES - the shaggy throat. This is what separates a raven from a crow,
    // and it is the second thing after the beak that makes the silhouette read.
    // Three angular points down the throat rather than a smooth curve.
    hull() { translate([-13, 63]) circle(r = 6); translate([-20, 55]) circle(r = 2.2); }
    hull() { translate([ -9, 58]) circle(r = 7); translate([-17, 48]) circle(r = 2.4); }
    hull() { translate([ -5, 52]) circle(r = 8); translate([-13, 41]) circle(r = 2.6); }

    // wedge tail - ravens carry a diamond-tipped wedge where a crow's fans out
    hull() { translate([11, 25]) circle(r = 12);
             translate([46,  6]) circle(r = 4.5); }
    hull() { translate([46,  6]) circle(r = 4.5);
             translate([56,  1]) circle(r = 1.8); }

    // legs down to the tang
    for (x = [-2, 9])
        rod([x, 24], [x, raven_foot_y + 2], raven_leg_w);

    // tang: same width and thickness as the figure's, so one stand takes either
    translate([-tang_w/2, raven_foot_y - tang_h]) square([tang_w, tang_h + 4]);
}

module raven_cuts() {
    translate([-19, 77]) circle(r = 2.4);              // eye, set forward

    // folded wing, as a swept line of rods. Cut rather than raised: a raised
    // band on a flat plate is just a taller plate, but a cut reads as shadow.
    // STOPS SHORT OF THE TAIL. Run down to [28,21] it met the first feather
    // split, and the two cuts together fenced a 19x15mm sliver of tail off from
    // the rest of the bird - a second shell, and in the real part a loose piece
    // that falls out. Same fault as the WiFi sign, where the wire crossing the
    // grin pinched off a 2.5mm island.
    wing = [[-2, 58], [8, 51], [17, 41], [24, 30]];
    for (i = [0 : len(wing)-2]) rod(wing[i], wing[i+1], 3);

    // three feather splits in the tail
    // kept SHORT and inboard: at 16mm they ran off the tail's edge and
    // serrated the outline instead of reading as feather splits
    for (i = [0 : 2])
        translate([31 + i*7, 19 - i*4]) rotate([0, 0, -29])
            square([11, 2.6], center = true);
}

module raven() {
    blocked = (base == "block");
    linear_extrude(height = thickness)
        difference() { raven_body(); raven_cuts(); }

    if (blocked)
        translate([-block_w/2, raven_foot_y + 4 - block_h, 0])
            cube([block_w, block_h + block_over, block_d]);
}

module stand() {
    // Square-cornered pocket: the tang is a plain rectangle, so a hulled
    // (round-ended) slot binds on its corners no matter how wide it is.
    slot_w = thickness + fit_clearance;
    slot_l = tang_w   + fit_clearance*2;
    difference() {
        hull()
            for (x = [-1, 1], y = [-1, 1])
                translate([x*(stand_l/2 - 5), y*(stand_w/2 - 5), 0])
                    cylinder(h = stand_h, r = 5);

        translate([0, 0, stand_h - slot_d])
            translate([-slot_l/2, -slot_w/2, 0])
                cube([slot_l, slot_w, slot_d + 1]);
    }
}

// ---------------------------------------------------------------- output

if (render_all) {
    moods = ["happy", "sad", "shocked", "scared", "stoic", "half", "poe"];
    for (i = [0:len(moods)-1])
        translate([(i - (len(moods)-1)/2)*spacing, 0]) figure(moods[i]);
} else if (part == "stand") {
    stand();
} else if (part == "raven") {
    raven();
} else {
    figure(mood);
}
